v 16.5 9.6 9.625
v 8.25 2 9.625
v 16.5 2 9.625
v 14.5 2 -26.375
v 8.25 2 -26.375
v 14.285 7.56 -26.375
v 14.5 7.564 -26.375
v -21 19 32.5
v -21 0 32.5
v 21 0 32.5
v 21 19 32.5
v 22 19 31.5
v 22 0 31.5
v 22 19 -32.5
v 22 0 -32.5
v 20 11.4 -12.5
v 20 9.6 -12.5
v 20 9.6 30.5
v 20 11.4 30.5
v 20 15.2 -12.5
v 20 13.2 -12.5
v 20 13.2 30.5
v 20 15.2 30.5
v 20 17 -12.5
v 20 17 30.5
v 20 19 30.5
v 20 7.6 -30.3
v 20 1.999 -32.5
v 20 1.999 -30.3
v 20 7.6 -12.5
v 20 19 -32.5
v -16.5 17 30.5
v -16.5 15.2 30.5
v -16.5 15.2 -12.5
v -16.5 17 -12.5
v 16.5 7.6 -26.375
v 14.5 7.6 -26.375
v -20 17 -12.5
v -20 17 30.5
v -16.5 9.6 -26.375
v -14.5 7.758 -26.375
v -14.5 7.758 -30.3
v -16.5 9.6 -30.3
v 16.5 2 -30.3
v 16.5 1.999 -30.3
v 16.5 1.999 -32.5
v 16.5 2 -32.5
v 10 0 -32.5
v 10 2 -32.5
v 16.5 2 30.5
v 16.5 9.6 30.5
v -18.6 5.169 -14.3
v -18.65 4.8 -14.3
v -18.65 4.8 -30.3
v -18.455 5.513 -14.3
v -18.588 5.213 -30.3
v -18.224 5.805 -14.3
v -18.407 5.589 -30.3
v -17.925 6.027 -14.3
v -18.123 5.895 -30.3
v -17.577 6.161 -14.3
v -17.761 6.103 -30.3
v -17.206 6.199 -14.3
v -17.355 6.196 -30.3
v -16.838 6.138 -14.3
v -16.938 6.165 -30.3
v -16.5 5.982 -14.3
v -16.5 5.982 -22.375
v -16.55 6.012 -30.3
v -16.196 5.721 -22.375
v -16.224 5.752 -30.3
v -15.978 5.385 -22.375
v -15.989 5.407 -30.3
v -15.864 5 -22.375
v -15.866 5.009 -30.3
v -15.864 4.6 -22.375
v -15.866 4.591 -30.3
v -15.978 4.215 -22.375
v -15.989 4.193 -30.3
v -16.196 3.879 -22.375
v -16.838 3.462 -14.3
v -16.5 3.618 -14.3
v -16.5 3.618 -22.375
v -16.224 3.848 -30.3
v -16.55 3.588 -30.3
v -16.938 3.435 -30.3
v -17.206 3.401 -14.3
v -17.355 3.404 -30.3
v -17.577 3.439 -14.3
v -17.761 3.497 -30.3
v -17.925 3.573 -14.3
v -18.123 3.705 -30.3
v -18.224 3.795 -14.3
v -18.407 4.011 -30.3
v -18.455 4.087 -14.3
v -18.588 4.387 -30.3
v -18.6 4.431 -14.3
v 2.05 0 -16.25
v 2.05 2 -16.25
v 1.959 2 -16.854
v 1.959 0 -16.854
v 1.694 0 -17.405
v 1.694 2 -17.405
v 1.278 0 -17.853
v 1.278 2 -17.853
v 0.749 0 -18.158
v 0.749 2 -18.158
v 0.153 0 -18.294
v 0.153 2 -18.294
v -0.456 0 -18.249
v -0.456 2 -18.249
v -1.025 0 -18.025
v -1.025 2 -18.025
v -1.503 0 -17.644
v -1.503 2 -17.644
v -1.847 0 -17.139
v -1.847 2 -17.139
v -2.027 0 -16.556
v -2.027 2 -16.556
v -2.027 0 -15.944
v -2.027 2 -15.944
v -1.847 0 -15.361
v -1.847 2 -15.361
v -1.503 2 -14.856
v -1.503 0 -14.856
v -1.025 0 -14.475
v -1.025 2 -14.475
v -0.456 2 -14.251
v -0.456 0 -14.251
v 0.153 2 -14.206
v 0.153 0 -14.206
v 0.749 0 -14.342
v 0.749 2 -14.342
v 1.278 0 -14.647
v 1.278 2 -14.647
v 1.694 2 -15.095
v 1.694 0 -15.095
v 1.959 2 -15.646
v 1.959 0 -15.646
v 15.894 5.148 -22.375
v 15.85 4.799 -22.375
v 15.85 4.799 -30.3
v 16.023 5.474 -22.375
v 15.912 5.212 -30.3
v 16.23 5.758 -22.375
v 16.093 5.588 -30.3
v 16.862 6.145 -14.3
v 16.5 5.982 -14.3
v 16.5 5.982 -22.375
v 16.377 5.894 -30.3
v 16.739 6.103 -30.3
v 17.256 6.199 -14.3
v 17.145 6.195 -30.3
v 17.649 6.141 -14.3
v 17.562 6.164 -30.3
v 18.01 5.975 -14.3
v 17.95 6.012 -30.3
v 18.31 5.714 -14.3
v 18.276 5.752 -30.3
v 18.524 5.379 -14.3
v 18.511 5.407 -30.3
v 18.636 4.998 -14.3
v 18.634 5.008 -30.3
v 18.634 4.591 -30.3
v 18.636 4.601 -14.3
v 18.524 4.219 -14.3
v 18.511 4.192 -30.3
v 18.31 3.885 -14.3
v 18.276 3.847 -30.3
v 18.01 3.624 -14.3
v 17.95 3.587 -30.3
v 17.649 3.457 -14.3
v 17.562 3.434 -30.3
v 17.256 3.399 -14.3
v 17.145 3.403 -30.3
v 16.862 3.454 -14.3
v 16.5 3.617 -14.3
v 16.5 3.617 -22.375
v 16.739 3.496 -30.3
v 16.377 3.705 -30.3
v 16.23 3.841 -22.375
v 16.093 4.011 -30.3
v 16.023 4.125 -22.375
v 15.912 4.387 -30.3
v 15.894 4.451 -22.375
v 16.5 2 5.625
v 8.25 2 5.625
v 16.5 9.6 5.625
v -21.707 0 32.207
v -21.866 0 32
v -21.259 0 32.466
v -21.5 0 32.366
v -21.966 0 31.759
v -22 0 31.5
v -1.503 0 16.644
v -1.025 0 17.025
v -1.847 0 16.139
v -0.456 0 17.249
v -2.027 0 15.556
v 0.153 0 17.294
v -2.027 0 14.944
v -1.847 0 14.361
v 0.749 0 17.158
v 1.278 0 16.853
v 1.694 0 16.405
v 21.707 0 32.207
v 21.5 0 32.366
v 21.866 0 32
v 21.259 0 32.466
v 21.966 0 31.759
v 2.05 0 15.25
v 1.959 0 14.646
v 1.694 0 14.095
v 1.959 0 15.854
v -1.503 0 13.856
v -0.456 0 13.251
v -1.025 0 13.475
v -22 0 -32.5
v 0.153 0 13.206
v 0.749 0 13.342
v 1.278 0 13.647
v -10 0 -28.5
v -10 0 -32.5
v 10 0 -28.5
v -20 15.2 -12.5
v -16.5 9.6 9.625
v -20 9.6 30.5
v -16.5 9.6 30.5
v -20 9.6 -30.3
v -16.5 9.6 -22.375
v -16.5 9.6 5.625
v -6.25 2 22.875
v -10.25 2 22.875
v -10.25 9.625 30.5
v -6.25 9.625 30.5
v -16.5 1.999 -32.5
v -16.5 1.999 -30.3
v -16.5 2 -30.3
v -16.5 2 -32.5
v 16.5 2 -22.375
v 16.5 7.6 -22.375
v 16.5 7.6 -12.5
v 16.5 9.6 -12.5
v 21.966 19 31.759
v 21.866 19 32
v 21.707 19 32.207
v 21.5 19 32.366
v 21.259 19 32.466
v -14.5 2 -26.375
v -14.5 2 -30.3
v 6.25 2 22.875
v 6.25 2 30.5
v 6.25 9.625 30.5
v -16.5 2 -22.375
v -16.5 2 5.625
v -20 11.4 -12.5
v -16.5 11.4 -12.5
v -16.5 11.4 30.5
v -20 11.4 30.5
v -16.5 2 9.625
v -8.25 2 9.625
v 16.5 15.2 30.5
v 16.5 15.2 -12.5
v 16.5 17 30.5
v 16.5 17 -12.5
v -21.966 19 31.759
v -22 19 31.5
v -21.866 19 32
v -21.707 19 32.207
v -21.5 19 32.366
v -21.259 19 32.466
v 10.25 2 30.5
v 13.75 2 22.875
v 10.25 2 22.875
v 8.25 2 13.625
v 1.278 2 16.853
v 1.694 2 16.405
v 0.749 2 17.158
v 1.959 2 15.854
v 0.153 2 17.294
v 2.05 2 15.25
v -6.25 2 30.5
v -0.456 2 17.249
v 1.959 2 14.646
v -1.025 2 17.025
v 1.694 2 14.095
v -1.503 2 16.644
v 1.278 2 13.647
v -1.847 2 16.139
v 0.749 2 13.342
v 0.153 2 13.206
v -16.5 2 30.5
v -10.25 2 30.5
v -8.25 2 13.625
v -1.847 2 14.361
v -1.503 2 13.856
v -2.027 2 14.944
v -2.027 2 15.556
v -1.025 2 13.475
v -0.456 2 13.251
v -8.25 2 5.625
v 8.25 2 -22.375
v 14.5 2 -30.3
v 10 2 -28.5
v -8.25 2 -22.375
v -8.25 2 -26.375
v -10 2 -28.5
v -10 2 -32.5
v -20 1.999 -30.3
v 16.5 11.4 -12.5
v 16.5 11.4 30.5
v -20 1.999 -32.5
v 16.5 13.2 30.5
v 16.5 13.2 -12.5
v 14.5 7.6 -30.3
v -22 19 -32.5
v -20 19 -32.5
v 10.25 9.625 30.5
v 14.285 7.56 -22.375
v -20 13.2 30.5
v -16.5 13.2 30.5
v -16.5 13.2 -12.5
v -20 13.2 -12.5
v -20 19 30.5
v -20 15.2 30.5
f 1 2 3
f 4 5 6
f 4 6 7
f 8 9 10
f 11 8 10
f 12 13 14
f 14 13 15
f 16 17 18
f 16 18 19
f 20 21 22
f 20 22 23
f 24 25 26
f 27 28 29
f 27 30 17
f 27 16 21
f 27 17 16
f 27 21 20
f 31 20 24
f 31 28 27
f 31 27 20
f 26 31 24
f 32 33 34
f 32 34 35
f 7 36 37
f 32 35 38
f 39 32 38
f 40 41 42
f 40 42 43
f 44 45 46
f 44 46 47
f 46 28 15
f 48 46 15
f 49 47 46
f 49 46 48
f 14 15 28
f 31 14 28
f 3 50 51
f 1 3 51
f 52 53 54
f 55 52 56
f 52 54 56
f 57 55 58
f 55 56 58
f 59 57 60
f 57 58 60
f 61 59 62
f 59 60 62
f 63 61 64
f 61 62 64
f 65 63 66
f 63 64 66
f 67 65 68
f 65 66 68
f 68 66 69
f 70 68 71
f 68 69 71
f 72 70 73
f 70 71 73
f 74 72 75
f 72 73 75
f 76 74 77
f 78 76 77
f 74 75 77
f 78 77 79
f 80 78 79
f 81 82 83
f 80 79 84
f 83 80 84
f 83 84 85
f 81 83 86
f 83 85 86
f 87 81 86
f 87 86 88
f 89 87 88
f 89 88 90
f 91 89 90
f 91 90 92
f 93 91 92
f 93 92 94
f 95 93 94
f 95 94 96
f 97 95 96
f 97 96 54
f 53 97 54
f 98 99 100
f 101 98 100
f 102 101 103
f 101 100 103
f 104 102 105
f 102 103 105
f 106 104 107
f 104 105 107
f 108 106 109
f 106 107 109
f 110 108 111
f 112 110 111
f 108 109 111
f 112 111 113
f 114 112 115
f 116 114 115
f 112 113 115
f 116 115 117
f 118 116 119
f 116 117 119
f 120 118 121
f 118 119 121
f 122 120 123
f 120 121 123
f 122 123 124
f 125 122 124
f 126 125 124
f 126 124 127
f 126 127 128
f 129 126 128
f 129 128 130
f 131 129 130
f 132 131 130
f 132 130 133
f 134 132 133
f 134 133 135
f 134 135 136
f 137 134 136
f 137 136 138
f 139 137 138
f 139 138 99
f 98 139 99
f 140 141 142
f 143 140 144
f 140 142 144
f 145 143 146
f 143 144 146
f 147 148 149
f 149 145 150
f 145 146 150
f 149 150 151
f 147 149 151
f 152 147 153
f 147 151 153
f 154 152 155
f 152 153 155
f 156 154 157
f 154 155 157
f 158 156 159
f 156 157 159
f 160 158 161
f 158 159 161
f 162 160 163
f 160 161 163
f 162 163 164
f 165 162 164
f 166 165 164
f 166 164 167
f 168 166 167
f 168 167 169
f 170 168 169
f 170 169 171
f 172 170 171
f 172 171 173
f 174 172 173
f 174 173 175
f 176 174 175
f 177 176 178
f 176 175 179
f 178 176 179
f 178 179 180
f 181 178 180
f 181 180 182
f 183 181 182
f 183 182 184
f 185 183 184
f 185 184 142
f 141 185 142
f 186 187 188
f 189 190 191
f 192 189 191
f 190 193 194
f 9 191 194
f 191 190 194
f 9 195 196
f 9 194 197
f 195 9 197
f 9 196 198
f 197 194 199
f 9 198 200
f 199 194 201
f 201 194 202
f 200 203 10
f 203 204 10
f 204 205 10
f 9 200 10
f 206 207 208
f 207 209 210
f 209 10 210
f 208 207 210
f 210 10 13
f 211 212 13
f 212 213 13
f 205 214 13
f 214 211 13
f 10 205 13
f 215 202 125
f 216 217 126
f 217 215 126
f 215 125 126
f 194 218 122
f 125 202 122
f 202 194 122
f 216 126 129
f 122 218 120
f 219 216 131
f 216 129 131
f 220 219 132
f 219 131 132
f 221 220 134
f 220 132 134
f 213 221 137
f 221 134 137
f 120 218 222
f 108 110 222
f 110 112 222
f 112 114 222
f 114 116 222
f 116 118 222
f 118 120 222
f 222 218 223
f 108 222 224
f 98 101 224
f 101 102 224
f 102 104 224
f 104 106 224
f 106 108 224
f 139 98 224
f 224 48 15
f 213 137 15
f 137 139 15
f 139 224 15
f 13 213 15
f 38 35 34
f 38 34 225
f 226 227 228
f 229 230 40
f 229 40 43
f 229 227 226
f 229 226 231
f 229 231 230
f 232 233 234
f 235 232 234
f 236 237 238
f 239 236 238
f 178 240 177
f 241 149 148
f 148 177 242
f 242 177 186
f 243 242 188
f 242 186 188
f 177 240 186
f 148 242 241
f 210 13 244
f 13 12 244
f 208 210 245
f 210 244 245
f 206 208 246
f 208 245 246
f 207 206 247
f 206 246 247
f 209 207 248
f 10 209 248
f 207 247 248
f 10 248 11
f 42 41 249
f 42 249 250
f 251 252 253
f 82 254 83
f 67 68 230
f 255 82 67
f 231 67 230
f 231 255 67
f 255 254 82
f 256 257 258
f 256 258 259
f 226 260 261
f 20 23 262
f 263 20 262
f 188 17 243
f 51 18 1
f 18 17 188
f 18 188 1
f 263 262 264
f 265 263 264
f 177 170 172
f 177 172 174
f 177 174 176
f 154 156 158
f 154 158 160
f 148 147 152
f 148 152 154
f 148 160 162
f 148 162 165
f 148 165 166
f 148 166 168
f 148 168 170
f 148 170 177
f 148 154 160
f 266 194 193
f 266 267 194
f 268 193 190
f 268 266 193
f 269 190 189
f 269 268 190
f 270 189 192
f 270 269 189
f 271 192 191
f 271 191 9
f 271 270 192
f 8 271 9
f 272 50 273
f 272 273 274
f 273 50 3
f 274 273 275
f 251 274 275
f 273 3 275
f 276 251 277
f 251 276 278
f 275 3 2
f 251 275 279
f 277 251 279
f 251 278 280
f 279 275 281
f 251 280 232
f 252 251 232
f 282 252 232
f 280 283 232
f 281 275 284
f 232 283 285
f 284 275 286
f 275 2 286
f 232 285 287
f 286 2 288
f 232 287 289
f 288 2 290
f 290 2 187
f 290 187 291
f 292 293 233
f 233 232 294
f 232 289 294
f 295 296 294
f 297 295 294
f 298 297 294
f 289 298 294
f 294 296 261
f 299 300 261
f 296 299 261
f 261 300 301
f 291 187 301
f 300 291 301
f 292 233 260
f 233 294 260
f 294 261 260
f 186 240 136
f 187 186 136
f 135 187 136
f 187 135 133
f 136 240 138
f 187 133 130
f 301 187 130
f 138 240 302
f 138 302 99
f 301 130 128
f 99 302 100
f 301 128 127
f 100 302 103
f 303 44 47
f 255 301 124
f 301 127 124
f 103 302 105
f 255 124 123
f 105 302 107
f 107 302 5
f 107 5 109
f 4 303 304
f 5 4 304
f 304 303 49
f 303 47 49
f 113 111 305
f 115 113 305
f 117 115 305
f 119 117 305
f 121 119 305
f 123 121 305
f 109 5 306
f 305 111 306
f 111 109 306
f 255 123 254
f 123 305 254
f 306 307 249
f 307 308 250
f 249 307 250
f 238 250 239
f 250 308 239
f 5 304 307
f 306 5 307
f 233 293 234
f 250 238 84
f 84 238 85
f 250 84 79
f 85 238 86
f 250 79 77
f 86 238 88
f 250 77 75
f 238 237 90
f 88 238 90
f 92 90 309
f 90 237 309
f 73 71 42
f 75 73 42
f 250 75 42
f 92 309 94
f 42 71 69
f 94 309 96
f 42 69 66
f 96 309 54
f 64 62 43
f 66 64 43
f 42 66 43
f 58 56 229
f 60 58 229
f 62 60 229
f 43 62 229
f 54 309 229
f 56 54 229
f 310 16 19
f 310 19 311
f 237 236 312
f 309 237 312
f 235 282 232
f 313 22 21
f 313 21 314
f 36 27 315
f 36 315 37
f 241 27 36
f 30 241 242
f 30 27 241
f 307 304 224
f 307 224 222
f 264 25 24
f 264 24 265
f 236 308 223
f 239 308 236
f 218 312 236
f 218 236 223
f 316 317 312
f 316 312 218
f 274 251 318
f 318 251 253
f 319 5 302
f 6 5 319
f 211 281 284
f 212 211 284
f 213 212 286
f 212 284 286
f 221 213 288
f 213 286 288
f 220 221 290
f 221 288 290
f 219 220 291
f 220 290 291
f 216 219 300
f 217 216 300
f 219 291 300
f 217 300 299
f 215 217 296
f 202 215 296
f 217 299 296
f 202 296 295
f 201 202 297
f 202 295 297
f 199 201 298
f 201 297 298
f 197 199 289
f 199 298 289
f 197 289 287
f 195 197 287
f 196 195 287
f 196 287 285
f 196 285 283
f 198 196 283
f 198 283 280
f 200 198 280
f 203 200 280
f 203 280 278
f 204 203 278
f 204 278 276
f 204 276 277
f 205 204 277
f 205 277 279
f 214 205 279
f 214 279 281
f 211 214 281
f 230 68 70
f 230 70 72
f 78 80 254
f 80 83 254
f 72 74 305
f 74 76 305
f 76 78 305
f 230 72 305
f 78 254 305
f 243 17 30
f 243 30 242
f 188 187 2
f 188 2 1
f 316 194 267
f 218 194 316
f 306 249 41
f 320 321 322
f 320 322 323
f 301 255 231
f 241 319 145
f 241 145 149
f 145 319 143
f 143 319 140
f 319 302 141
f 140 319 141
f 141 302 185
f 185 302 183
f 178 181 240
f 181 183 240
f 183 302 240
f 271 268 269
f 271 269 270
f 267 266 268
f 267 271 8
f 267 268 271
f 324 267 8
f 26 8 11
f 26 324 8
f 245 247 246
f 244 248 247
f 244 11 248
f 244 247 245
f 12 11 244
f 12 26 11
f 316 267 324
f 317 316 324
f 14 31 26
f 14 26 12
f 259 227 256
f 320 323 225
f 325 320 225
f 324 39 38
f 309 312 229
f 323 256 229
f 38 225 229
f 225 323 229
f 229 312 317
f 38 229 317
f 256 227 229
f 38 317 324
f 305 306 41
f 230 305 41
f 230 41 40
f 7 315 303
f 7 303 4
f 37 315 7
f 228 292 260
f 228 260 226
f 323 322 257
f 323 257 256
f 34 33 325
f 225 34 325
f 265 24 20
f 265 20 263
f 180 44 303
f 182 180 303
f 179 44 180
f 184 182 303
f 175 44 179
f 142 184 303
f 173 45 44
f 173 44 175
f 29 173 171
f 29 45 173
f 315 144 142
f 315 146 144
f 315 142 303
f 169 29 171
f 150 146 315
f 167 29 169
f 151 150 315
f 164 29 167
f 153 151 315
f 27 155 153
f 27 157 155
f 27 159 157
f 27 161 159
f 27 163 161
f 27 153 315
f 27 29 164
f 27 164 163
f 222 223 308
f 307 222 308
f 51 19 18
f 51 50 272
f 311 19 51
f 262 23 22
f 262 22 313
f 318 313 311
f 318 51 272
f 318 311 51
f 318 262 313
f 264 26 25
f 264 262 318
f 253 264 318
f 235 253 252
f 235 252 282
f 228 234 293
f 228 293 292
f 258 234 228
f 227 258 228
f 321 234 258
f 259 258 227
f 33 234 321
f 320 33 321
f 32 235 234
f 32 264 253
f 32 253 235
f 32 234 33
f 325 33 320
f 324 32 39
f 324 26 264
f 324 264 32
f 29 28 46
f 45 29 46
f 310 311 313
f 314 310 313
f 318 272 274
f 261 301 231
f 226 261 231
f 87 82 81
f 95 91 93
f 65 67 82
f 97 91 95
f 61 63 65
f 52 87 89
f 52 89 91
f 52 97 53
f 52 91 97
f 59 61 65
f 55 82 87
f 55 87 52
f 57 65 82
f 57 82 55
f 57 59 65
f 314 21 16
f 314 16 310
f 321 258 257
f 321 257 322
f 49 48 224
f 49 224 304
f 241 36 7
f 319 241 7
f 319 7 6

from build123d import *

# Parameters (mm, degrees)
ESBO_O1_W                = 44
ESBO_O1_H                = 65
RESSALTO_EXTRUS_O1_DEPTH = 19
ESBO_O2_W                = 40
ESBO_O2_H                = 15
CORTE_EXTRUS_O1_DEPTH    = 20
ESBO_O3_W                = 40
ESBO_O3_H                = 1.8
CORTE_EXTRUS_O2_DEPTH    = 43
ESBO_O4_W                = 33
ESBO_O4_H                = 7.6
CORTE_EXTRUS_O3_DEPTH    = 43
ESBO_O5_W                = 3.5
ESBO_O5_H                = 7.6
RESSALTO_EXTRUS_O2_DEPTH = 20
ESBO_O6_W                = 33
ESBO_O6_H                = 5.6
CORTE_EXTRUS_O4_DEPTH    = 43
ESBO_O7_W                = 3.5
ESBO_O7_H                = 2
ESBO_O7_W_2              = 40
CORTE_EXTRUS_O5_DEPTH    = 63
ESBO_O8_R                = 2.05
CORTE_EXTRUS_O6_DEPTH    = 3
ESBO_O9_W                = 3.5
ESBO_O9_H                = 7.601315145
CORTE_EXTRUS_O7_DEPTH    = 4
ESBO_O10_W               = 3.5
ESBO_O10_H               = 2
CORTE_EXTRUS_O9_DEPTH    = 16
ESBO_O12_W               = 8.25
ESBO_O12_H               = 4
ESBO_O12_W_2             = 4
ESBO_O12_H_2             = 7.625
RESSALTO_EXTRUS_O3_DEPTH = 8
CORTE_EXTRUS_O10_DEPTH   = 40
CORTE_EXTRUS_O11_DEPTH   = 24
RESSALTO_EXTRUS_O4_DEPTH = 1.8
ESBO_O18_W               = 3.925
ESBO_O18_H               = 5.6
RESSALTO_EXTRUS_O5_DEPTH = 2
CORTE_EXTRUS_O12_DEPTH   = 10
ESBO_O20_R               = 1.4
CORTE_EXTRUS_O13_DEPTH   = 16
ESBO_O21_W               = 3.925
ESBO_O21_H               = 7.6
RESSALTO_EXTRUS_O6_DEPTH = 2
CORTE_EXTRUS_O14_DEPTH   = 5
ESBO_O24_R               = 1.4
CORTE_EXTRUS_O15_DEPTH   = 16
ESBO_O26_W               = 20
ESBO_O26_H               = 2
CORTE_EXTRUS_O16_DEPTH   = 4
FILETE1_R                = 1


with BuildPart() as part:
    # Esboço1 → Ressalto-extrusão1 (new body)
    with BuildSketch(Plane(origin=(0, 0, 0), x_dir=(1, 0, 0), z_dir=(0, 1, 0))):
        Rectangle(ESBO_O1_W, ESBO_O1_H)
    extrude(amount=RESSALTO_EXTRUS_O1_DEPTH)

    # Esboço2 → Corte-extrusão1 (cut)
    with BuildSketch(Plane(origin=(0, 0, -32.5), x_dir=(-1, 0, 0), z_dir=(0, 0, -1))):
        with Locations((0, 9.5)):
            Rectangle(ESBO_O2_W, ESBO_O2_H)
    extrude(amount=-CORTE_EXTRUS_O1_DEPTH, mode=Mode.SUBTRACT)

    # Esboço3 → Corte-extrusão2 (cut)
    with BuildSketch(Plane(origin=(0, 0, -12.5), x_dir=(-1, 0, 0), z_dir=(0, 0, -1))):
        with Locations((0, 10.5)):
            Rectangle(ESBO_O3_W, ESBO_O3_H)
    extrude(amount=-CORTE_EXTRUS_O2_DEPTH, mode=Mode.SUBTRACT)

    # Esboço4 → Corte-extrusão3 (cut)
    with BuildSketch(Plane(origin=(0, 0, -12.5), x_dir=(-1, 0, 0), z_dir=(0, 0, -1))):
        with Locations((0, 5.8)):
            Rectangle(ESBO_O4_W, ESBO_O4_H)
    extrude(amount=-CORTE_EXTRUS_O3_DEPTH, mode=Mode.SUBTRACT)

    # Esboço5 → Ressalto-extrusão2 (add)
    with BuildSketch(Plane(origin=(0, 0, -12.5), x_dir=(-1, 0, 0), z_dir=(0, 0, -1))):
        with Locations((-18.25, 5.8)):
            Rectangle(ESBO_O5_W, ESBO_O5_H)
        with Locations((18.25, 5.8)):
            Rectangle(ESBO_O5_W, ESBO_O5_H)
    extrude(amount=RESSALTO_EXTRUS_O2_DEPTH)

    # Esboço6 → Corte-extrusão4 (cut)
    with BuildSketch(Plane(origin=(0, 0, -12.5), x_dir=(-1, 0, 0), z_dir=(0, 0, -1))):
        with Locations((0, 14.2)):
            Rectangle(ESBO_O6_W, ESBO_O6_H)
    extrude(amount=-CORTE_EXTRUS_O4_DEPTH, mode=Mode.SUBTRACT)

    # Esboço7 → Corte-extrusão5 (cut)
    with BuildSketch(Plane(origin=(0, 0, -32.5), x_dir=(-1, 0, 0), z_dir=(0, 0, -1))):
        with Locations((-18.25, 14.2)):
            Rectangle(ESBO_O7_W, ESBO_O7_H)
        with Locations((18.25, 14.2)):
            Rectangle(ESBO_O7_W, ESBO_O7_H)
        with Locations((0, 18)):
            Rectangle(ESBO_O7_W_2, ESBO_O7_H)
    extrude(amount=-CORTE_EXTRUS_O5_DEPTH, mode=Mode.SUBTRACT)

    # Esboço8 → Corte-extrusão6 (cut, through all)
    with BuildSketch(Plane(origin=(0, 2, 0), x_dir=(1, 0, 0), z_dir=(0, 1, 0))):
        with Locations((0, 16.25)):
            Circle(ESBO_O8_R)
        with Locations((0, -15.25)):
            Circle(ESBO_O8_R)
    extrude(amount=-CORTE_EXTRUS_O6_DEPTH, mode=Mode.SUBTRACT)

    # Esboço9 → Corte-extrusão7 (cut)
    with BuildSketch(Plane(origin=(0, 0, -32.5), x_dir=(-1, 0, 0), z_dir=(0, 0, -1))):
        with Locations((18.25, 5.799342428)):
            Rectangle(ESBO_O9_W, ESBO_O9_H)
        with Locations((-18.25, 5.799342428)):
            Rectangle(ESBO_O9_W, ESBO_O9_H)
    extrude(amount=-CORTE_EXTRUS_O7_DEPTH, mode=Mode.SUBTRACT)

    # Esboço10 → Corte-extrusão9 (cut)
    with BuildSketch(Plane(origin=(0, 0, -28.5), x_dir=(-1, 0, 0), z_dir=(0, 0, -1))):
        with Locations((-18.25, 8.6)):
            Rectangle(ESBO_O10_W, ESBO_O10_H)
    extrude(amount=-CORTE_EXTRUS_O9_DEPTH, mode=Mode.SUBTRACT)

    # Esboço12 → Ressalto-extrusão3 (add)
    with BuildSketch(Plane(origin=(0, 2, 0), x_dir=(1, 0, 0), z_dir=(0, 1, 0))):
        with Locations((12.375, 24.375)):
            Rectangle(ESBO_O12_W, ESBO_O12_H)
        with Locations((12.375, -7.625)):
            Rectangle(ESBO_O12_W, ESBO_O12_H)
        with Locations((8.25, -26.6875)):
            Rectangle(ESBO_O12_W_2, ESBO_O12_H_2)
        with Locations((-8.25, -26.6875)):
            Rectangle(ESBO_O12_W_2, ESBO_O12_H_2)
        with Locations((-12.375, -7.625)):
            Rectangle(ESBO_O12_W, ESBO_O12_H)
        with Locations((-12.375, 24.375)):
            Rectangle(ESBO_O12_W, ESBO_O12_H)
    extrude(amount=RESSALTO_EXTRUS_O3_DEPTH)

    # Esboço13 → Corte-extrusão10 (cut)
    with BuildSketch(Plane(origin=(0, 0, -26.375), x_dir=(-1, 0, 0), z_dir=(0, 0, -1))):
        Polygon((-8.25, 10), (-8.25, 2), (-16.5, 9.6), (-16.5, 10), align=None)
        Polygon((8.25, 2), (16.5, 9.6), (16.5, 10), (8.25, 10), align=None)
    extrude(amount=-CORTE_EXTRUS_O10_DEPTH, mode=Mode.SUBTRACT)

    # Esboço14 → Corte-extrusão11 (cut)
    with BuildSketch(Plane.ZY.offset(10.25)):
        Polygon((22.875, 2), (30.5, 9.625), (30.5, 10), (22.875, 10), align=None)
    extrude(amount=-CORTE_EXTRUS_O11_DEPTH, mode=Mode.SUBTRACT)

    # Esboço17 → Ressalto-extrusão4 (add)
    with BuildSketch(Plane(origin=(0, 0, -28.5), x_dir=(-1, 0, 0), z_dir=(0, 0, -1))):
        Polygon((-16.5, 2), (-16.5, 7.6), (-20, 7.6), (-20, 1.998684855), (-16.5, 1.998684855), align=None)
        Polygon((16.5, 9.6), (16.5, 2), (16.5, 1.998684855), (20, 1.998684855), (20, 9.6), align=None)
    extrude(amount=RESSALTO_EXTRUS_O4_DEPTH)

    # Esboço18 → Ressalto-extrusão5 (add)
    with BuildSketch(Plane.ZY.offset(-16.5)):
        with Locations((-28.3375, 4.8)):
            Rectangle(ESBO_O18_W, ESBO_O18_H)
    extrude(amount=RESSALTO_EXTRUS_O5_DEPTH)

    # Esboço19 → Corte-extrusão12 (cut)
    with BuildSketch(Plane(origin=(0, 0, -26.375), x_dir=(-1, 0, 0), z_dir=(0, 0, -1))):
        Polygon((-16.5, 9.6), (-16.5, 7.6), (-14.285160283, 7.559662806), align=None)
    extrude(amount=-CORTE_EXTRUS_O12_DEPTH, mode=Mode.SUBTRACT)

    # Esboço20 → Corte-extrusão13 (cut)
    with BuildSketch(Plane(origin=(0, 0, -30.3), x_dir=(-1, 0, 0), z_dir=(0, 0, -1))):
        with Locations((-17.25, 4.799342428)):
            Circle(ESBO_O20_R)
    extrude(amount=-CORTE_EXTRUS_O13_DEPTH, mode=Mode.SUBTRACT)

    # Esboço21 → Ressalto-extrusão6 (add)
    with BuildSketch(Plane(origin=(-16.5, 0, 0), x_dir=(0, 0, -1), z_dir=(1, 0, 0))):
        with Locations((28.3375, 5.8)):
            Rectangle(ESBO_O21_W, ESBO_O21_H)
    extrude(amount=RESSALTO_EXTRUS_O6_DEPTH)

    # Esboço23 → Corte-extrusão14 (cut)
    with BuildSketch(Plane(origin=(0, 0, -30.3), x_dir=(-1, 0, 0), z_dir=(0, 0, -1))):
        Polygon((13.624579494, 6.951127777), (17.102092839, 10.154655221), (13.624579494, 10.154655221), align=None)
    extrude(amount=-CORTE_EXTRUS_O14_DEPTH, mode=Mode.SUBTRACT)

    # Esboço24 → Corte-extrusão15 (cut)
    with BuildSketch(Plane(origin=(0, 0, -30.3), x_dir=(-1, 0, 0), z_dir=(0, 0, -1))):
        with Locations((17.25, 4.8)):
            Circle(ESBO_O24_R)
    extrude(amount=-CORTE_EXTRUS_O15_DEPTH, mode=Mode.SUBTRACT)

    # Esboço26 → Corte-extrusão16 (cut)
    with BuildSketch(Plane(origin=(0, 0, -32.5), x_dir=(-1, 0, 0), z_dir=(0, 0, -1))):
        with Locations((0, 1)):
            Rectangle(ESBO_O26_W, ESBO_O26_H)
    extrude(amount=-CORTE_EXTRUS_O16_DEPTH, mode=Mode.SUBTRACT)

    # Filete1
    filete1_edges = [part.edges().sort_by_distance(p)[0] for p in [
        (22, 9.5, 32.5),
        (-22, 9.5, 32.5),
    ]]
    fillet(filete1_edges, radius=FILETE1_R)


solid = part.part
